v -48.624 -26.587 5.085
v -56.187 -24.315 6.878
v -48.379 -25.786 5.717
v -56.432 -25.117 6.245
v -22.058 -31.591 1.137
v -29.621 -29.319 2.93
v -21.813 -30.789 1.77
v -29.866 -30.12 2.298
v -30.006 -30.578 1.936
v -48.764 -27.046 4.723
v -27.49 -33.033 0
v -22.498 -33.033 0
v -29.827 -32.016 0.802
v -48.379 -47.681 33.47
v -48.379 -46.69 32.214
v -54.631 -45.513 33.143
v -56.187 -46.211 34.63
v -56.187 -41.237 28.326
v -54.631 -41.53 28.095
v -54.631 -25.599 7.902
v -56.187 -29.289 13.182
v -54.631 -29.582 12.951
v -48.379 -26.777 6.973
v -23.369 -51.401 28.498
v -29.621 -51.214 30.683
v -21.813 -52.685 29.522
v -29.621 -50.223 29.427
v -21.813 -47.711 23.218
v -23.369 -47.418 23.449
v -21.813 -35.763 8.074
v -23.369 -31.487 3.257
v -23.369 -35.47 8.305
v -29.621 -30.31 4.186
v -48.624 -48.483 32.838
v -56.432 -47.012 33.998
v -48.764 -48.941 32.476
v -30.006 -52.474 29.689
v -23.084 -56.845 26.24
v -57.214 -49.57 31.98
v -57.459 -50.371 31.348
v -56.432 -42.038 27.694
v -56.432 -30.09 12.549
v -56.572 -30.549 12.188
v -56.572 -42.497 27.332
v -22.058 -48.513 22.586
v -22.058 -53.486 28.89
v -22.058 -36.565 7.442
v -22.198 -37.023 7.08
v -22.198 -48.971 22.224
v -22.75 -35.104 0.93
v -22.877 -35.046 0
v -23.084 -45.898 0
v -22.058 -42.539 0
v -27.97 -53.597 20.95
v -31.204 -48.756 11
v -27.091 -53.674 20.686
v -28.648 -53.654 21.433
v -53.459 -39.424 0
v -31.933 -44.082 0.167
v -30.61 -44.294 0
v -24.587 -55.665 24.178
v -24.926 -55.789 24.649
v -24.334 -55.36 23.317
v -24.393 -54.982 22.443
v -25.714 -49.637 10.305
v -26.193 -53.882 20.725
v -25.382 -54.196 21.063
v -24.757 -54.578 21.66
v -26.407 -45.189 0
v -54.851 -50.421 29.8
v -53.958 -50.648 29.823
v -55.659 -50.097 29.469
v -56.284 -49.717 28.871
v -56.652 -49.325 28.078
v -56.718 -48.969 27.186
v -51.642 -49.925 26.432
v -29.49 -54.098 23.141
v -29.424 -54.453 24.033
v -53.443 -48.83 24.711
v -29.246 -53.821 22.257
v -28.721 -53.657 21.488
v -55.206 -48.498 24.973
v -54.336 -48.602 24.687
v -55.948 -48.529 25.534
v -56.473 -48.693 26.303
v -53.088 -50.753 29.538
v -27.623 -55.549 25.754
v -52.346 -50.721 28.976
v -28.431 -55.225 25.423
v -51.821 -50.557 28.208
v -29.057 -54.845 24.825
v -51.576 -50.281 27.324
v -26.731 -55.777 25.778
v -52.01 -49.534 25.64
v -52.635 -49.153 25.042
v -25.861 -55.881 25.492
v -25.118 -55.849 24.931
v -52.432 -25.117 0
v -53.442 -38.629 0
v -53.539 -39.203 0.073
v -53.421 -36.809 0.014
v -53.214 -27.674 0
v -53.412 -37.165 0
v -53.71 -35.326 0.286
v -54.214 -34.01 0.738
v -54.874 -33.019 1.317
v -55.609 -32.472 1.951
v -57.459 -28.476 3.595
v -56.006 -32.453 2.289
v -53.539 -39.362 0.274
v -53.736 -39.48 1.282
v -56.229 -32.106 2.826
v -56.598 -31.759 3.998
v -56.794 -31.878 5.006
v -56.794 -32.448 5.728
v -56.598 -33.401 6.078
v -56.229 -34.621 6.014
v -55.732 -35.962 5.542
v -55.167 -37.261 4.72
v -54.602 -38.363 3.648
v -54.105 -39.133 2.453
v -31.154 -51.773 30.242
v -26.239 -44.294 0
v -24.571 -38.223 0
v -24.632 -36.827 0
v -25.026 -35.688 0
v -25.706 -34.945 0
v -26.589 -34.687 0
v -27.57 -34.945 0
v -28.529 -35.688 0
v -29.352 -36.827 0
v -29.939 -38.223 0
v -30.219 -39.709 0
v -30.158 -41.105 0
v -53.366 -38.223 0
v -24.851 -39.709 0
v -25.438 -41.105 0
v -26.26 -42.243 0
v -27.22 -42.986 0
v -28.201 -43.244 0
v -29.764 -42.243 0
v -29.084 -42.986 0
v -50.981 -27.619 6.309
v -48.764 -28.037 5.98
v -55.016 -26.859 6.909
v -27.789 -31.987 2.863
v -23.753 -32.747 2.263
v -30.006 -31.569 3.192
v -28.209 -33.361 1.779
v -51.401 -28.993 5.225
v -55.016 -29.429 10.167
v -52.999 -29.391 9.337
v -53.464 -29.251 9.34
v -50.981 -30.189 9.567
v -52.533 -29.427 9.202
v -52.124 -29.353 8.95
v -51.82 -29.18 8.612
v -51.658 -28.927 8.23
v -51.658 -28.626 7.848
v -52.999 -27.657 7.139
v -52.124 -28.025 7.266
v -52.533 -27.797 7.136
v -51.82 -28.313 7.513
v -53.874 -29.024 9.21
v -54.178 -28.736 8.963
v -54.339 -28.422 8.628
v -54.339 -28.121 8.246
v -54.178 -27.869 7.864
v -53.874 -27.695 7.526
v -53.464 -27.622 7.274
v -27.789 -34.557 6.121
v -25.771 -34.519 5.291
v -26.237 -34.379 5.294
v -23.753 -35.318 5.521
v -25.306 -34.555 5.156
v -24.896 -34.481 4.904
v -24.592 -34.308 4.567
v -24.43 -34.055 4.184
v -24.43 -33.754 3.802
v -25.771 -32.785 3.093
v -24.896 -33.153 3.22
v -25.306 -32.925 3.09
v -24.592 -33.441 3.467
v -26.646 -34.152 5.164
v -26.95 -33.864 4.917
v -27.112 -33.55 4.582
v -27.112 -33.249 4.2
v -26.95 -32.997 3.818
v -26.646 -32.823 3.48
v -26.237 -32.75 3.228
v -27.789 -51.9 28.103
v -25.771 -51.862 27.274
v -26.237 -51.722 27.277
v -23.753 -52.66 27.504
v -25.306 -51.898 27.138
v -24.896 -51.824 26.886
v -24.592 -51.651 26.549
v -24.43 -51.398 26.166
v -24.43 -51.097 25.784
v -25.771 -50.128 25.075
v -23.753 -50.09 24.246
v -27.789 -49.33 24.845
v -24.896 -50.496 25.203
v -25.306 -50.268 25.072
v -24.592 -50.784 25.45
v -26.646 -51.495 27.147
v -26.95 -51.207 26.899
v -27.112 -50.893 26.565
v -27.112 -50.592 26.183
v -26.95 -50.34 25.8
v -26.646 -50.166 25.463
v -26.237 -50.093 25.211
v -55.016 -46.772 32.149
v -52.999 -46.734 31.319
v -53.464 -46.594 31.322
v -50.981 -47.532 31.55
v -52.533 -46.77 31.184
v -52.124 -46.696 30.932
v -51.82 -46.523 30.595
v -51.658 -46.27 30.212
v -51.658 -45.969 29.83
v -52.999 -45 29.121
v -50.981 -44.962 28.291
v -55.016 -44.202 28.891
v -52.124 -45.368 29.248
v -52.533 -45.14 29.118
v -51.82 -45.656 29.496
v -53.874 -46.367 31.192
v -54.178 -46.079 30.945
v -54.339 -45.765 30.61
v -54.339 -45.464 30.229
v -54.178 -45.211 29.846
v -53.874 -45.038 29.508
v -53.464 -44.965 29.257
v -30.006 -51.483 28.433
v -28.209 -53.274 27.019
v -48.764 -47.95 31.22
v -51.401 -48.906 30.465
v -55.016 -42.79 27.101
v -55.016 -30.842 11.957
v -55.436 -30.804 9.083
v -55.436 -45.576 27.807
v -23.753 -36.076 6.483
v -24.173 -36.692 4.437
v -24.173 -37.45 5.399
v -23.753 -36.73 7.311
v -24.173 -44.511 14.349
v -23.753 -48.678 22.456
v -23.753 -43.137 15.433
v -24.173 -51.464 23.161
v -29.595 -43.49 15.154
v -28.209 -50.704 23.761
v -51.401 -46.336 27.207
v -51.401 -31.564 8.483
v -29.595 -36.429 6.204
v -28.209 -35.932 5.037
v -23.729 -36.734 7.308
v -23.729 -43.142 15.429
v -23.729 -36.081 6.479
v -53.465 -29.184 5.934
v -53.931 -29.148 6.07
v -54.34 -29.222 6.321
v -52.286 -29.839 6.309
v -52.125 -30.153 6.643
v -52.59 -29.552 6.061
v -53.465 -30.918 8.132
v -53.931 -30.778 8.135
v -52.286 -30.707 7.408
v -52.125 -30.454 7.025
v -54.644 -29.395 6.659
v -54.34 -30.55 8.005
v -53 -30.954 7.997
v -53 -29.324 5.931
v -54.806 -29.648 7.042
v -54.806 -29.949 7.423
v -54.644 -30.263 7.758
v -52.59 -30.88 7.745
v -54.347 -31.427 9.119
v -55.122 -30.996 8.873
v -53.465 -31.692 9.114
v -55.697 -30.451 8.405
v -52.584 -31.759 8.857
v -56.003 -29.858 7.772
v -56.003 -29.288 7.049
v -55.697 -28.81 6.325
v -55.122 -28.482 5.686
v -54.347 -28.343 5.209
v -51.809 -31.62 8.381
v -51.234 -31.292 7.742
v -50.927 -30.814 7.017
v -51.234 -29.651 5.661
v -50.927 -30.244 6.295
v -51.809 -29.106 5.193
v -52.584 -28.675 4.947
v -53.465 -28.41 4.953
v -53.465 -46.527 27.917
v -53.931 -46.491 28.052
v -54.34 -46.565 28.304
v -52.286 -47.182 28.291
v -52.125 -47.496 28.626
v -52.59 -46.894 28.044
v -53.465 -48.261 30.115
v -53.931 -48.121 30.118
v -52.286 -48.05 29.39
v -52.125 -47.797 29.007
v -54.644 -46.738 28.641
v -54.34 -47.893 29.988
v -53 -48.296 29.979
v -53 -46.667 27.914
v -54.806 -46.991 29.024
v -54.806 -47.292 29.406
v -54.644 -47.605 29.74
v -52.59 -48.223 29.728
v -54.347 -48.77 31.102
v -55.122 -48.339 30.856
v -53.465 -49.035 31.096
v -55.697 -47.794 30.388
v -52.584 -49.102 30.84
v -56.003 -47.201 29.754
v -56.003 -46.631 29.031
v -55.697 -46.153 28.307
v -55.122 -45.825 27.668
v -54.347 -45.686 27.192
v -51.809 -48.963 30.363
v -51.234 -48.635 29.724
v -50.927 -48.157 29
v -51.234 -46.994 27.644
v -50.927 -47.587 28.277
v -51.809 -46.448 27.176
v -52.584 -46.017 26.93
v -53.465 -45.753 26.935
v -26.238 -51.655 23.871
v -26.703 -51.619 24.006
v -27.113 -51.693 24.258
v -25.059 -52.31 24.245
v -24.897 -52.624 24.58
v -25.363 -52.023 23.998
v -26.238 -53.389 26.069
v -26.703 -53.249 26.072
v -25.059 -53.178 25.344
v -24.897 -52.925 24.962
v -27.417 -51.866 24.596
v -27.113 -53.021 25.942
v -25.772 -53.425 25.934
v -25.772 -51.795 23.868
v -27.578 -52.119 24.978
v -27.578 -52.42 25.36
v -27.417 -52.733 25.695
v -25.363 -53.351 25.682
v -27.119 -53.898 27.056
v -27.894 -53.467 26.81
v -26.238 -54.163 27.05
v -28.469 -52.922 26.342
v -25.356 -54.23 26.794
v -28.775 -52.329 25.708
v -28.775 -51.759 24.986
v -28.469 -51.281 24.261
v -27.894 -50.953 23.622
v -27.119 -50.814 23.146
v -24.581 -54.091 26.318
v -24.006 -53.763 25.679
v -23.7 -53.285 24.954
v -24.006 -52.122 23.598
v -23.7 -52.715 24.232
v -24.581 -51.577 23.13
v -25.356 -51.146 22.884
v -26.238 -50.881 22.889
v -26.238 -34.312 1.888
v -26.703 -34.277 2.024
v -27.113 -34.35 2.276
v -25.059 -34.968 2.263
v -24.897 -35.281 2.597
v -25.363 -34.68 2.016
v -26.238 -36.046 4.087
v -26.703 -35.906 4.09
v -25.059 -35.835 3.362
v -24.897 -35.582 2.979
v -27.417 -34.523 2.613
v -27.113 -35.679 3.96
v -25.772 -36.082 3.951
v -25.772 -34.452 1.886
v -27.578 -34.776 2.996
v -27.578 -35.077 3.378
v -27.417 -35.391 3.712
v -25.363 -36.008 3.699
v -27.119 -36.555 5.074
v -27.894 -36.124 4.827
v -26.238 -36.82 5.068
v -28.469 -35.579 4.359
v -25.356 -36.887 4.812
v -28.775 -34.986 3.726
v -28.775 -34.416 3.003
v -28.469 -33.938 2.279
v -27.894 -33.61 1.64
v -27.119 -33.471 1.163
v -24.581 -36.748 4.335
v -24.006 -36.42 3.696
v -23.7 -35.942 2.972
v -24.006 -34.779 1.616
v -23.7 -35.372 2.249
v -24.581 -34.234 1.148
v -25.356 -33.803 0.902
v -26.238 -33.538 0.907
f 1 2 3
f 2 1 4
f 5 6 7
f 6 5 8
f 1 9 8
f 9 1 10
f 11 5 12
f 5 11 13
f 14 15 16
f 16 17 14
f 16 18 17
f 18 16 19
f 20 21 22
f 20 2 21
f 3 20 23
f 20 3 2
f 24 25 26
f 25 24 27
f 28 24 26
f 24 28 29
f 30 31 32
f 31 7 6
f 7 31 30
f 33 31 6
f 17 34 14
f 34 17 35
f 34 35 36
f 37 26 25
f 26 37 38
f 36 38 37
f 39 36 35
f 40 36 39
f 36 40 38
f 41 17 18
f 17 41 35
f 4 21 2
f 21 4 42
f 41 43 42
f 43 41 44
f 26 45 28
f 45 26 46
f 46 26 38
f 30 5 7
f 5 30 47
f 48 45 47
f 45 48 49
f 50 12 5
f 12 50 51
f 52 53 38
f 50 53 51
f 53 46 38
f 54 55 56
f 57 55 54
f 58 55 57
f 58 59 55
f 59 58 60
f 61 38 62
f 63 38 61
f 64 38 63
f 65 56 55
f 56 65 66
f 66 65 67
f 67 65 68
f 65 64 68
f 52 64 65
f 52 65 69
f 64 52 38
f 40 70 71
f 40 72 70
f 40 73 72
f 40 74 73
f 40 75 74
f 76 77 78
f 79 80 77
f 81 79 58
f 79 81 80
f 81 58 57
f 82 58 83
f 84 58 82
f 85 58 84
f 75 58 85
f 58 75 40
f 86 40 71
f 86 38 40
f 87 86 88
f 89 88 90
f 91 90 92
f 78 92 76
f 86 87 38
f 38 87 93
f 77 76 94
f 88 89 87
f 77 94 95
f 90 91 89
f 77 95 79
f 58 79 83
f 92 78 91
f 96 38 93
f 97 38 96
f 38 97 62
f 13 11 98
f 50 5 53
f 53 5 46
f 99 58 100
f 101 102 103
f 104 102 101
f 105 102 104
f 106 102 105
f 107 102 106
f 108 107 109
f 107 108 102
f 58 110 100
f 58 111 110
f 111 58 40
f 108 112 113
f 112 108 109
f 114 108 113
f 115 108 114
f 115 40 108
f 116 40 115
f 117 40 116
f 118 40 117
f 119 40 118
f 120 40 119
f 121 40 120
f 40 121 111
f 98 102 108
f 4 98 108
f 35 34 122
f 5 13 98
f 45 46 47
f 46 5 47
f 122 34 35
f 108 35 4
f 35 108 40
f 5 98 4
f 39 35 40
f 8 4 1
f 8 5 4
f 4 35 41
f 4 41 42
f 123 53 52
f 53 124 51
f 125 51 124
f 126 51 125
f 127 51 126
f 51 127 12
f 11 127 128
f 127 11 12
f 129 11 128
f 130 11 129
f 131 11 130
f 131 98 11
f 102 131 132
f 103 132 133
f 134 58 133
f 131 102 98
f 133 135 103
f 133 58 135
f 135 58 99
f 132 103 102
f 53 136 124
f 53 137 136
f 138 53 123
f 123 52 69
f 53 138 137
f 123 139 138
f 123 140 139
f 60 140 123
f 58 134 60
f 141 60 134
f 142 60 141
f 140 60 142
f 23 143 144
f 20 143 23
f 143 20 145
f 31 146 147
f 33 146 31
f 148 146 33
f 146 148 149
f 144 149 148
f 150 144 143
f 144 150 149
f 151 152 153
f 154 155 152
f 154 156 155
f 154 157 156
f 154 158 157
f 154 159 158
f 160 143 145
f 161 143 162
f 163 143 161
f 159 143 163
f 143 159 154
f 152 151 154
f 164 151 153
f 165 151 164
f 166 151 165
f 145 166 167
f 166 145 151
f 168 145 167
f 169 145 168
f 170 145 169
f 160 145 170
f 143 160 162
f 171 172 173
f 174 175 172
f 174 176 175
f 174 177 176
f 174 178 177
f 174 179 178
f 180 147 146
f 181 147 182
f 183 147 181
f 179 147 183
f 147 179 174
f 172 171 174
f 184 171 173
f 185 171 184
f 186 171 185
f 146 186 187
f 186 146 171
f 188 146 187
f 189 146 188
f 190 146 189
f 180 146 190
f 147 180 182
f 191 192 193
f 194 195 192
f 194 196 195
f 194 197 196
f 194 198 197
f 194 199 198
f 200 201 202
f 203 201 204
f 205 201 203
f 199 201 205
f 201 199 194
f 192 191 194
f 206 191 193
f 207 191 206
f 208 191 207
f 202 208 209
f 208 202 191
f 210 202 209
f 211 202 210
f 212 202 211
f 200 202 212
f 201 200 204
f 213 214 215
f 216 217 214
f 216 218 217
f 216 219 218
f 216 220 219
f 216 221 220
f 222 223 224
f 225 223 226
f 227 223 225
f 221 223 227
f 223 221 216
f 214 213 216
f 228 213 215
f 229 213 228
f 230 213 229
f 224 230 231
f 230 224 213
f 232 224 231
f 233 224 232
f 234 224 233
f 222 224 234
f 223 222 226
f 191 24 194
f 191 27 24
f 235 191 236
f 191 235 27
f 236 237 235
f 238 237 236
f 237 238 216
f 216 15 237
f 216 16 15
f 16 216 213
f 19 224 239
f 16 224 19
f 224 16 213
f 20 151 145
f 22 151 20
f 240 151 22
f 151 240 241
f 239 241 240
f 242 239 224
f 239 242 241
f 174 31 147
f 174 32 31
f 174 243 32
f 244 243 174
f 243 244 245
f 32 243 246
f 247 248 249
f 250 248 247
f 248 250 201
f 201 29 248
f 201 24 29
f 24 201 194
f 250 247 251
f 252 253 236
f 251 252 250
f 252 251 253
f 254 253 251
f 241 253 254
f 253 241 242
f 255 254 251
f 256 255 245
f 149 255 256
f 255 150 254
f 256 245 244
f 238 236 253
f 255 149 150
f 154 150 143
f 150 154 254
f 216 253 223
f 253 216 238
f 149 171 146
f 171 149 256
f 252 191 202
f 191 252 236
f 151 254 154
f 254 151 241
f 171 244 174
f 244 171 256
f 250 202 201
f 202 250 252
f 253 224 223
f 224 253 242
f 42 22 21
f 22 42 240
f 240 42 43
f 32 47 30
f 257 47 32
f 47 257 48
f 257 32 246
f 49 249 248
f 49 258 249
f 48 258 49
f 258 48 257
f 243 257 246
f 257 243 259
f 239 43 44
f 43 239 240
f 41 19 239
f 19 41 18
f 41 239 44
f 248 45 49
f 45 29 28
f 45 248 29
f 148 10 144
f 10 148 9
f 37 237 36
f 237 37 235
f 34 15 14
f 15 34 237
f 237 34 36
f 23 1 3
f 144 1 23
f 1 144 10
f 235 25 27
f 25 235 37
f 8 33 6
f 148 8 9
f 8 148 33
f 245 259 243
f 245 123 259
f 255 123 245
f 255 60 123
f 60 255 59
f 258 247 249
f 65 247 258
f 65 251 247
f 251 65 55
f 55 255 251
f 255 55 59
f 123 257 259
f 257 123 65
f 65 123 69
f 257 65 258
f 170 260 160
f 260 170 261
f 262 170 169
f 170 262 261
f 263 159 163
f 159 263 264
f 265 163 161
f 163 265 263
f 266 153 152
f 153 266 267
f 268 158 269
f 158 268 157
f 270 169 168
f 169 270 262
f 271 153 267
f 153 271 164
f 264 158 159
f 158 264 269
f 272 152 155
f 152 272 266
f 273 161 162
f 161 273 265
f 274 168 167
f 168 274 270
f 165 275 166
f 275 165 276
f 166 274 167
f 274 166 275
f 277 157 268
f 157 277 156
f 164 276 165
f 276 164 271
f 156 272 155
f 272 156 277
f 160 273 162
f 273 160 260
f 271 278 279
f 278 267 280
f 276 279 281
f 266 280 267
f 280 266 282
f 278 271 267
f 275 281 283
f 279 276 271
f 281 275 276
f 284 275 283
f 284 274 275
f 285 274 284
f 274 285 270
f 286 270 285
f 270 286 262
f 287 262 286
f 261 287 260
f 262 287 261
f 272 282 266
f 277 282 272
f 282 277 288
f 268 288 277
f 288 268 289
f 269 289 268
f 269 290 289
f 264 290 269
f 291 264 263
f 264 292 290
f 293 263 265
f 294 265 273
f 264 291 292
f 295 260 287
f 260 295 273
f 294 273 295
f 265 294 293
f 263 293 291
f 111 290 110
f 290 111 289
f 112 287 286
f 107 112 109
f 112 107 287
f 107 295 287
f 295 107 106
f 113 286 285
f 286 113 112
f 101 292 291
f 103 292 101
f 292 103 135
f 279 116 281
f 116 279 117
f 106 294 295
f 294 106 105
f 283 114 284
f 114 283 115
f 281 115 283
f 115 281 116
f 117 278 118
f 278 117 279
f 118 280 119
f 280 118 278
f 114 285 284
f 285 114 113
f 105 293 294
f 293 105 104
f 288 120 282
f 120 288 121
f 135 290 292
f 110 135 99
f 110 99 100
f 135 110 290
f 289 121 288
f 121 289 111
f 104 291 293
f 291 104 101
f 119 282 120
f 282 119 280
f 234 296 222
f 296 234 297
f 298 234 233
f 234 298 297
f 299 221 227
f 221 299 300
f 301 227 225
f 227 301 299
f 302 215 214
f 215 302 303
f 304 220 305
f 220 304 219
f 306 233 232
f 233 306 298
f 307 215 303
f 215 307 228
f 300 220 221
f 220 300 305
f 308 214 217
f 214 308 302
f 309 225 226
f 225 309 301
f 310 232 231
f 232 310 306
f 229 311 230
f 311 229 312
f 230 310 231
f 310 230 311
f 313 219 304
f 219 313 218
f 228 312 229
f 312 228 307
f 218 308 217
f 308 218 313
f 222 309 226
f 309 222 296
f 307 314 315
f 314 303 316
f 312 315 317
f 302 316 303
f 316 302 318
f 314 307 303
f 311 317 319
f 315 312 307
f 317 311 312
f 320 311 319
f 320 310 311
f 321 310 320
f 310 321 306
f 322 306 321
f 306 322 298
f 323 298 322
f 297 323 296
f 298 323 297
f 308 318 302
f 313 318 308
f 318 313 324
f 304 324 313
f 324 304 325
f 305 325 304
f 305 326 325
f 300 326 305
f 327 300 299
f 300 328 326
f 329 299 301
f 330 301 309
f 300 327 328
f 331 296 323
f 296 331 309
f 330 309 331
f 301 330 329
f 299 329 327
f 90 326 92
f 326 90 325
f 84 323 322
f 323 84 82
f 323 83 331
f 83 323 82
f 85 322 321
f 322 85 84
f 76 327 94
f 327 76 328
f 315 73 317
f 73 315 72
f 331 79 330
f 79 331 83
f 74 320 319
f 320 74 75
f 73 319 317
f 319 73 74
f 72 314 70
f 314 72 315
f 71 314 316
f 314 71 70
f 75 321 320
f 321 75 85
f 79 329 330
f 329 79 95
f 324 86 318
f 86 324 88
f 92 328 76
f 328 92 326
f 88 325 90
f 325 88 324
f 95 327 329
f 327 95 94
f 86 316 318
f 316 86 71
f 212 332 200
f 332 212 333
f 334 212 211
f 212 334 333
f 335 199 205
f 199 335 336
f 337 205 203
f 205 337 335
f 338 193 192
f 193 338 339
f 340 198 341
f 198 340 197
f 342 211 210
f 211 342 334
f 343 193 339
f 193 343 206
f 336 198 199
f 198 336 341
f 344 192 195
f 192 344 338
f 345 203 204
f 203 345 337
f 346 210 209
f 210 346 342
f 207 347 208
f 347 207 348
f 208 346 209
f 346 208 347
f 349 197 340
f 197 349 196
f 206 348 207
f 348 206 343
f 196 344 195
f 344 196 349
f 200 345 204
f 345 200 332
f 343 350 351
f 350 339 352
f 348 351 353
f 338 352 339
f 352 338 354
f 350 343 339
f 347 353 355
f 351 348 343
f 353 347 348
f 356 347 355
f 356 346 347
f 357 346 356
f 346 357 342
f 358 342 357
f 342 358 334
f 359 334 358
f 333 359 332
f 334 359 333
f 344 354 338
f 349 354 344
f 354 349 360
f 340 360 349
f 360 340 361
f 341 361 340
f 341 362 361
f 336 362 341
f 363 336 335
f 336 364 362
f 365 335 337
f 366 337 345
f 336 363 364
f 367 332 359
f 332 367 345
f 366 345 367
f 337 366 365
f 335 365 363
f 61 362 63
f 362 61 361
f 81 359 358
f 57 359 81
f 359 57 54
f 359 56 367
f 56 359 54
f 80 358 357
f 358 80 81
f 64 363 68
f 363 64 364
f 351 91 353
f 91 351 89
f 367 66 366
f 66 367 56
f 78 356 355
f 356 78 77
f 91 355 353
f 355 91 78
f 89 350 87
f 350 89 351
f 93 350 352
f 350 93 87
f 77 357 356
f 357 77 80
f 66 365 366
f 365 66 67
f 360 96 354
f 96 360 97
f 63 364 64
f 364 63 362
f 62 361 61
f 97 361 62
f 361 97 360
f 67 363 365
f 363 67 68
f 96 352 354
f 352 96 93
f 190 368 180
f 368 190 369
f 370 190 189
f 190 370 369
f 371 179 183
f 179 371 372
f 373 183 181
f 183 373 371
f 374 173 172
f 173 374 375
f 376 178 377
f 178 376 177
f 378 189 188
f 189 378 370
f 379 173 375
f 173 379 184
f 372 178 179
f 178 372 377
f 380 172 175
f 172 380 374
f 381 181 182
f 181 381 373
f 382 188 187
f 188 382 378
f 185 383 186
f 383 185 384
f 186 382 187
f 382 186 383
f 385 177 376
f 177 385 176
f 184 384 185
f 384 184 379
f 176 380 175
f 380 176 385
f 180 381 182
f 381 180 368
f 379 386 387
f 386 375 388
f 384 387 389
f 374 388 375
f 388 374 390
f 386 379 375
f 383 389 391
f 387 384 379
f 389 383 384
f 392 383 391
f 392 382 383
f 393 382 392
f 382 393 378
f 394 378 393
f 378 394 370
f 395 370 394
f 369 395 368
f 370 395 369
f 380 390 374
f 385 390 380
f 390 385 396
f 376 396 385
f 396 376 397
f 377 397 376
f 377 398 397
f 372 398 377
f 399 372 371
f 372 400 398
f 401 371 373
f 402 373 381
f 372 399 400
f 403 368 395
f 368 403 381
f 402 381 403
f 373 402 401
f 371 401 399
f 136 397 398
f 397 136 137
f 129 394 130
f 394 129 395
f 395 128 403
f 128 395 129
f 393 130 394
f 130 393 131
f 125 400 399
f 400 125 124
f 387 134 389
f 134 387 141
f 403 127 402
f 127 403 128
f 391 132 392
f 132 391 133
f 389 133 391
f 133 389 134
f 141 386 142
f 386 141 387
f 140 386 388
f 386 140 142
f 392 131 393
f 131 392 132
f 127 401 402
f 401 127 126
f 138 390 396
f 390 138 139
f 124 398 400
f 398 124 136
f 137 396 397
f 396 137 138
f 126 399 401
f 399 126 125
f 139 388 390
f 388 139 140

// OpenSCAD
// Generated from camera_mount.py
$fa=20; $fs=0.2;
e=0.01;

keep_both = false;
keep_bed_mount = false;
keep_camera_mount = !keep_bed_mount || keep_both;
if (keep_camera_mount && ! keep_both) {
  keep_bed_mount = false;
}

echo("keep_both = ", keep_both);
echo("keep_bed_ = ", keep_bed_mount);
echo("keep_cam_ = ", keep_camera_mount);



difference(){
	translate(v = [0, 0, 16.2000000000]) {
		rotate(a = 90, v = [0, -1, 0]) {
			difference() {
				union() {
					union() {
						union() {
							difference() {
								difference() {
									difference() {
										linear_extrude(center = false, height = 5.5000000000) {
											intersection() {
												rotate(a = 45) {
													translate(v = [-20, -20]) {
														square(size = [24, 40]);
													}
												}
												square(center = true, size = [32.4000000000, 32.4000000000]);
											}
										}
										translate(v = [-10, 0, 0]) {
											translate(v = [0, 0, 4.9000000000]) {
											}
										}
									}
									translate(v = [0, -10, 0]) {
										translate(v = [0, 0, 4.9000000000]) {
										}
									}
								}
								union() {
									cylinder(h = 4.0000000000, r = 14.6500000000);
									translate(v = [-5, -5, 0]) {
										cube(size = [15, 15, 5.5000200000]);
									}
								}
							}
							translate(v = [2, -38.5000000000, 39.0000000000]) {
								rotate(a = 141.7284958095, v = [0, 0, 1]) {
									rotate(a = 103.4903442936, v = [1, 0, 0]) {
										translate(v = [0, 0, -1.6500000000]) {
											union() {
												union() {
													union() {
														union() {
															difference() {
																translate(v = [-17.6750000000, -17.6750000000, -3.8000000000]) {
																	cube(center = false, size = [35.3500000000, 35.3500000000, 5.4500000000]);
																}
															}
															translate(v = [14.0000000000, 14.0000000000, 0]) {
																union() {
																	translate(v = [-2.0750000000, -2.0750000000, -1.8000000000]) {
																		cube(center = false, size = [4.1500000000, 4.1500000000, 1.8000000000]);
																	}
																	translate(v = [0, 0, -2.0000000000]) {
																		mirror(v = [0, 0, 1]) {
																		}
																	}
																}
															}
														}
														translate(v = [-14.0000000000, 14.0000000000, 0]) {
															union() {
																translate(v = [-2.0750000000, -2.0750000000, -1.8000000000]) {
																	cube(center = false, size = [4.1500000000, 4.1500000000, 1.8000000000]);
																}
																translate(v = [0, 0, -2.0000000000]) {
																	mirror(v = [0, 0, 1]) {
																	}
																}
															}
														}
													}
													translate(v = [-14.0000000000, -14.0000000000, 0]) {
														union() {
															translate(v = [-2.0750000000, -2.0750000000, -1.8000000000]) {
																cube(center = false, size = [4.1500000000, 4.1500000000, 1.8000000000]);
															}
															translate(v = [0, 0, -2.0000000000]) {
																mirror(v = [0, 0, 1]) {
																}
															}
														}
													}
												}
												translate(v = [14.0000000000, -14.0000000000, 0]) {
													union() {
														translate(v = [-2.0750000000, -2.0750000000, -1.8000000000]) {
															cube(center = false, size = [4.1500000000, 4.1500000000, 1.8000000000]);
														}
														translate(v = [0, 0, -2.0000000000]) {
															mirror(v = [0, 0, 1]) {
															}
														}
													}
												}
											}
										}
									}
								}
							}
						}
						polyhedron(faces = [[0, 2, 14], [15, 2, 0], [0, 7, 15], [14, 10, 0], [14, 2, 1], [1, 2, 15], [15, 3, 1], [1, 13, 14], [15, 4, 3], [6, 10, 14], [14, 13, 6], [7, 4, 15], [11, 7, 0], [0, 10, 11], [1, 3, 12], [12, 13, 1], [3, 4, 12], [8, 12, 4], [13, 5, 6], [9, 10, 6], [11, 4, 7], [9, 11, 10], [12, 8, 9], [13, 12, 9], [11, 8, 4], [5, 13, 9], [6, 5, 9], [8, 11, 9]], points = [[-16.2000000000, -42.5386946614, 22.0576121145], [-16.2000000000, -39.423557734, 53.4587175901], [-16.2000000000, -45.8977578213, 23.0840506837], [-16.2000000000, -27.6742687274, 53.2137720224], [-16.2000000000, -25.1168001852, 52.4322790208], [15.7801466406, -49.5696575051, 57.2137720224], [9.62235765664, -54.9938575924, 23.889105116], [-15.1499900000, -34.1484688147, 22.839105116], [-9.95488857563, -25.1168001852, 56.4322790208], [17.797849132, -47.0121889629, 56.4322790208], [12.6900601481, -53.4863890502, 22.0576121145], [-15.0626775596, -31.5910002725, 22.0576121145], [-12.6050052809, -28.4758633451, 57.4587175901], [15.1477324268, -50.3712521228, 57.4587175901], [10.0399434429, -56.8454522102, 23.0840506837], [-17.7127942648, -34.9500634324, 23.0840506837]]);
					}
					%union() {
						union() {
							minkowski() {
								polyhedron(faces = [[0, 1, 2], [0, 2, 3], [1, 0, 4], [4, 5, 1], [2, 1, 5], [5, 6, 2], [3, 2, 6], [6, 7, 3], [0, 3, 7], [7, 4, 0], [6, 5, 4], [7, 6, 4]], points = [[-15.1500000000, 10.0000000000, 5.5000000000], [-15.1500000000, -10.0000000000, 5.5000000000], [-15.1499900000, -34.1484688147, 22.839105116], [-15.1499900000, -27.6742687274, 53.2137720224], [-15.1000000000, 10.0000000000, 5.5500000000], [-15.1000000000, -10.0000000000, 5.5500000000], [-15.0999900000, -34.1484688147, 22.889105116], [-15.0999900000, -27.6742687274, 53.2637720224]]);
								sphere(r = 1.0500000000);
							}
							minkowski() {
								polyhedron(faces = [[0, 1, 2], [1, 0, 3], [3, 4, 1], [2, 1, 4], [4, 5, 2], [0, 2, 5], [5, 3, 0], [5, 4, 3]], points = [[-15.1500000000, -10.0000000000, 5.5000000000], [-10.0000000000, -15.1500000000, 5.5000000000], [-15.1499900000, -34.1484688147, 22.839105116], [-15.1000000000, -10.0000000000, 5.5500000000], [-9.9500000000, -15.1500000000, 5.5500000000], [-15.0999900000, -34.1484688147, 22.889105116]]);
								sphere(r = 1.0500000000);
							}
						}
						minkowski() {
							polyhedron(faces = [[0, 1, 2], [0, 2, 3], [1, 0, 4], [4, 5, 1], [2, 1, 5], [5, 6, 2], [3, 2, 6], [6, 7, 3], [0, 3, 7], [7, 4, 0], [6, 5, 4], [7, 6, 4]], points = [[-10.0000000000, -15.1500000000, 5.5000000000], [10.0000000000, -15.1500000000, 5.5000000000], [9.62235765664, -54.9938575924, 23.889105116], [-15.1499900000, -34.1484688147, 22.839105116], [-9.9500000000, -15.1500000000, 5.5500000000], [10.0500000000, -15.1500000000, 5.5500000000], [9.67235765664, -54.9938575924, 23.939105116], [-15.0999900000, -34.1484688147, 22.889105116]]);
							sphere(r = 1.0500000000);
						}
					}
				}
				translate(v = [-216.2000000000, -100, -100+e]) {
					cube(size = [200, 200, 200]);
				}
			}
		}
	}
	/* Holes Below*/
	translate(v = [0, 0, 16.2000000000]){
		rotate(a = 90, v = [0, -1, 0]){
			difference(){
				union(){
					union(){
						union(){
							union(){
								union(){
									union(){
										translate(v = [-10, 0, 0]){
											translate(v = [0, 0, 4.9000000000]){
												union() {
													translate(v = [0, 0, -4.1500000000]) {
														cylinder(h = 4.1500000000, r = 1.6500000000);
													}
													cylinder(h = 2.5500000000, r = 3.1500000000);
												}
											}
										}
									}
									translate(v = [0, -10, 0]){
										translate(v = [0, 0, 4.9000000000]){
											union() {
												translate(v = [0, 0, -4.1500000000]) {
													cylinder(h = 4.1500000000, r = 1.6500000000);
												}
												cylinder(h = 2.5500000000, r = 3.1500000000);
											}
										}
									}
								}
							}
							translate(v = [2, -38.5000000000, 39.0000000000]){
								rotate(a = 141.7284958095, v = [0, 0, 1]){
									rotate(a = 103.4903442936, v = [1, 0, 0]){
										translate(v = [0, 0, -1.6500000000]){
											union(){
												union(){
													union(){
														union(){
															union(){
																union() {
																	union() {
																		union() {
																			union() {
																				union() {
																					translate(v = [-16.0750000000, -16.0750000000, 0]) {
																						cube(center = false, size = [32.1500000000, 32.1500000000, 1.6500100000]);
																					}
																					translate(v = [-16.0750000000, -11.9250000000, -1.8000000000]) {
																						cube(center = false, size = [32.1500000000, 23.8500000000, 1.8000100000]);
																					}
																				}
																				translate(v = [-11.9250000000, -16.0750000000, -1.8000000000]) {
																					cube(center = false, size = [23.8500000000, 32.1500000000, 1.8000100000]);
																				}
																			}
																			translate(v = [-9.6450000000, -17.6750000000, 0]) {
																				cube(center = false, size = [19.2900000000, 35.3500000000, 1.6500100000]);
																			}
																		}
																		translate(v = [-17.6750000000, -9.6450000000, 0]) {
																			cube(center = false, size = [35.3500000000, 19.2900000000, 1.6500100000]);
																		}
																	}
																	translate(v = [5, -13.3000000000, 0]) {
																		translate(v = [-5.7000000000, -2.8000000000, -15.0000000000]) {
																			cube(center = false, size = [11.4000000000, 5.6000000000, 15.0000000000]);
																		}
																	}
																}
															}
															translate(v = [14.0000000000, 14.0000000000, 0]){
																union(){
																	translate(v = [0, 0, -2.0000000000]){
																		mirror(v = [0, 0, 1]){
																			union() {
																				translate(v = [0, 0, -4.1500000000]) {
																					cylinder(h = 4.1500000000, r = 1.4000000000);
																				}
																				cylinder(h = 15.1500000000, r = 2.6500000000);
																			}
																		}
																	}
																}
															}
														}
														translate(v = [-14.0000000000, 14.0000000000, 0]){
															union(){
																translate(v = [0, 0, -2.0000000000]){
																	mirror(v = [0, 0, 1]){
																		union() {
																			translate(v = [0, 0, -4.1500000000]) {
																				cylinder(h = 4.1500000000, r = 1.4000000000);
																			}
																			cylinder(h = 15.1500000000, r = 2.6500000000);
																		}
																	}
																}
															}
														}
													}
													translate(v = [-14.0000000000, -14.0000000000, 0]){
														union(){
															translate(v = [0, 0, -2.0000000000]){
																mirror(v = [0, 0, 1]){
																	union() {
																		translate(v = [0, 0, -4.1500000000]) {
																			cylinder(h = 4.1500000000, r = 1.4000000000);
																		}
																		cylinder(h = 15.1500000000, r = 2.6500000000);
																	}
																}
															}
														}
													}
												}
												translate(v = [14.0000000000, -14.0000000000, 0]){
													union(){
														translate(v = [0, 0, -2.0000000000]){
															mirror(v = [0, 0, 1]){
																union() {
																	translate(v = [0, 0, -4.1500000000]) {
																		cylinder(h = 4.1500000000, r = 1.4000000000);
																	}
																	cylinder(h = 15.1500000000, r = 2.6500000000);
																}
															}
														}
													}
												}
											}
										}
									}
								}
							}
						}
					}
				}
			}
		}
	} /* End Holes */
	if (!keep_camera_mount) {
	  translate(v = [-60.0000000000, -65.0000000000, -e]){
	    cube(44, center=false);
	  }
	}
	if (!keep_bed_mount) {
	  translate(v = [-18.0000000000, -18.0000000000, -e]){
	    cube(36, center=false);
	  }
	}

}
